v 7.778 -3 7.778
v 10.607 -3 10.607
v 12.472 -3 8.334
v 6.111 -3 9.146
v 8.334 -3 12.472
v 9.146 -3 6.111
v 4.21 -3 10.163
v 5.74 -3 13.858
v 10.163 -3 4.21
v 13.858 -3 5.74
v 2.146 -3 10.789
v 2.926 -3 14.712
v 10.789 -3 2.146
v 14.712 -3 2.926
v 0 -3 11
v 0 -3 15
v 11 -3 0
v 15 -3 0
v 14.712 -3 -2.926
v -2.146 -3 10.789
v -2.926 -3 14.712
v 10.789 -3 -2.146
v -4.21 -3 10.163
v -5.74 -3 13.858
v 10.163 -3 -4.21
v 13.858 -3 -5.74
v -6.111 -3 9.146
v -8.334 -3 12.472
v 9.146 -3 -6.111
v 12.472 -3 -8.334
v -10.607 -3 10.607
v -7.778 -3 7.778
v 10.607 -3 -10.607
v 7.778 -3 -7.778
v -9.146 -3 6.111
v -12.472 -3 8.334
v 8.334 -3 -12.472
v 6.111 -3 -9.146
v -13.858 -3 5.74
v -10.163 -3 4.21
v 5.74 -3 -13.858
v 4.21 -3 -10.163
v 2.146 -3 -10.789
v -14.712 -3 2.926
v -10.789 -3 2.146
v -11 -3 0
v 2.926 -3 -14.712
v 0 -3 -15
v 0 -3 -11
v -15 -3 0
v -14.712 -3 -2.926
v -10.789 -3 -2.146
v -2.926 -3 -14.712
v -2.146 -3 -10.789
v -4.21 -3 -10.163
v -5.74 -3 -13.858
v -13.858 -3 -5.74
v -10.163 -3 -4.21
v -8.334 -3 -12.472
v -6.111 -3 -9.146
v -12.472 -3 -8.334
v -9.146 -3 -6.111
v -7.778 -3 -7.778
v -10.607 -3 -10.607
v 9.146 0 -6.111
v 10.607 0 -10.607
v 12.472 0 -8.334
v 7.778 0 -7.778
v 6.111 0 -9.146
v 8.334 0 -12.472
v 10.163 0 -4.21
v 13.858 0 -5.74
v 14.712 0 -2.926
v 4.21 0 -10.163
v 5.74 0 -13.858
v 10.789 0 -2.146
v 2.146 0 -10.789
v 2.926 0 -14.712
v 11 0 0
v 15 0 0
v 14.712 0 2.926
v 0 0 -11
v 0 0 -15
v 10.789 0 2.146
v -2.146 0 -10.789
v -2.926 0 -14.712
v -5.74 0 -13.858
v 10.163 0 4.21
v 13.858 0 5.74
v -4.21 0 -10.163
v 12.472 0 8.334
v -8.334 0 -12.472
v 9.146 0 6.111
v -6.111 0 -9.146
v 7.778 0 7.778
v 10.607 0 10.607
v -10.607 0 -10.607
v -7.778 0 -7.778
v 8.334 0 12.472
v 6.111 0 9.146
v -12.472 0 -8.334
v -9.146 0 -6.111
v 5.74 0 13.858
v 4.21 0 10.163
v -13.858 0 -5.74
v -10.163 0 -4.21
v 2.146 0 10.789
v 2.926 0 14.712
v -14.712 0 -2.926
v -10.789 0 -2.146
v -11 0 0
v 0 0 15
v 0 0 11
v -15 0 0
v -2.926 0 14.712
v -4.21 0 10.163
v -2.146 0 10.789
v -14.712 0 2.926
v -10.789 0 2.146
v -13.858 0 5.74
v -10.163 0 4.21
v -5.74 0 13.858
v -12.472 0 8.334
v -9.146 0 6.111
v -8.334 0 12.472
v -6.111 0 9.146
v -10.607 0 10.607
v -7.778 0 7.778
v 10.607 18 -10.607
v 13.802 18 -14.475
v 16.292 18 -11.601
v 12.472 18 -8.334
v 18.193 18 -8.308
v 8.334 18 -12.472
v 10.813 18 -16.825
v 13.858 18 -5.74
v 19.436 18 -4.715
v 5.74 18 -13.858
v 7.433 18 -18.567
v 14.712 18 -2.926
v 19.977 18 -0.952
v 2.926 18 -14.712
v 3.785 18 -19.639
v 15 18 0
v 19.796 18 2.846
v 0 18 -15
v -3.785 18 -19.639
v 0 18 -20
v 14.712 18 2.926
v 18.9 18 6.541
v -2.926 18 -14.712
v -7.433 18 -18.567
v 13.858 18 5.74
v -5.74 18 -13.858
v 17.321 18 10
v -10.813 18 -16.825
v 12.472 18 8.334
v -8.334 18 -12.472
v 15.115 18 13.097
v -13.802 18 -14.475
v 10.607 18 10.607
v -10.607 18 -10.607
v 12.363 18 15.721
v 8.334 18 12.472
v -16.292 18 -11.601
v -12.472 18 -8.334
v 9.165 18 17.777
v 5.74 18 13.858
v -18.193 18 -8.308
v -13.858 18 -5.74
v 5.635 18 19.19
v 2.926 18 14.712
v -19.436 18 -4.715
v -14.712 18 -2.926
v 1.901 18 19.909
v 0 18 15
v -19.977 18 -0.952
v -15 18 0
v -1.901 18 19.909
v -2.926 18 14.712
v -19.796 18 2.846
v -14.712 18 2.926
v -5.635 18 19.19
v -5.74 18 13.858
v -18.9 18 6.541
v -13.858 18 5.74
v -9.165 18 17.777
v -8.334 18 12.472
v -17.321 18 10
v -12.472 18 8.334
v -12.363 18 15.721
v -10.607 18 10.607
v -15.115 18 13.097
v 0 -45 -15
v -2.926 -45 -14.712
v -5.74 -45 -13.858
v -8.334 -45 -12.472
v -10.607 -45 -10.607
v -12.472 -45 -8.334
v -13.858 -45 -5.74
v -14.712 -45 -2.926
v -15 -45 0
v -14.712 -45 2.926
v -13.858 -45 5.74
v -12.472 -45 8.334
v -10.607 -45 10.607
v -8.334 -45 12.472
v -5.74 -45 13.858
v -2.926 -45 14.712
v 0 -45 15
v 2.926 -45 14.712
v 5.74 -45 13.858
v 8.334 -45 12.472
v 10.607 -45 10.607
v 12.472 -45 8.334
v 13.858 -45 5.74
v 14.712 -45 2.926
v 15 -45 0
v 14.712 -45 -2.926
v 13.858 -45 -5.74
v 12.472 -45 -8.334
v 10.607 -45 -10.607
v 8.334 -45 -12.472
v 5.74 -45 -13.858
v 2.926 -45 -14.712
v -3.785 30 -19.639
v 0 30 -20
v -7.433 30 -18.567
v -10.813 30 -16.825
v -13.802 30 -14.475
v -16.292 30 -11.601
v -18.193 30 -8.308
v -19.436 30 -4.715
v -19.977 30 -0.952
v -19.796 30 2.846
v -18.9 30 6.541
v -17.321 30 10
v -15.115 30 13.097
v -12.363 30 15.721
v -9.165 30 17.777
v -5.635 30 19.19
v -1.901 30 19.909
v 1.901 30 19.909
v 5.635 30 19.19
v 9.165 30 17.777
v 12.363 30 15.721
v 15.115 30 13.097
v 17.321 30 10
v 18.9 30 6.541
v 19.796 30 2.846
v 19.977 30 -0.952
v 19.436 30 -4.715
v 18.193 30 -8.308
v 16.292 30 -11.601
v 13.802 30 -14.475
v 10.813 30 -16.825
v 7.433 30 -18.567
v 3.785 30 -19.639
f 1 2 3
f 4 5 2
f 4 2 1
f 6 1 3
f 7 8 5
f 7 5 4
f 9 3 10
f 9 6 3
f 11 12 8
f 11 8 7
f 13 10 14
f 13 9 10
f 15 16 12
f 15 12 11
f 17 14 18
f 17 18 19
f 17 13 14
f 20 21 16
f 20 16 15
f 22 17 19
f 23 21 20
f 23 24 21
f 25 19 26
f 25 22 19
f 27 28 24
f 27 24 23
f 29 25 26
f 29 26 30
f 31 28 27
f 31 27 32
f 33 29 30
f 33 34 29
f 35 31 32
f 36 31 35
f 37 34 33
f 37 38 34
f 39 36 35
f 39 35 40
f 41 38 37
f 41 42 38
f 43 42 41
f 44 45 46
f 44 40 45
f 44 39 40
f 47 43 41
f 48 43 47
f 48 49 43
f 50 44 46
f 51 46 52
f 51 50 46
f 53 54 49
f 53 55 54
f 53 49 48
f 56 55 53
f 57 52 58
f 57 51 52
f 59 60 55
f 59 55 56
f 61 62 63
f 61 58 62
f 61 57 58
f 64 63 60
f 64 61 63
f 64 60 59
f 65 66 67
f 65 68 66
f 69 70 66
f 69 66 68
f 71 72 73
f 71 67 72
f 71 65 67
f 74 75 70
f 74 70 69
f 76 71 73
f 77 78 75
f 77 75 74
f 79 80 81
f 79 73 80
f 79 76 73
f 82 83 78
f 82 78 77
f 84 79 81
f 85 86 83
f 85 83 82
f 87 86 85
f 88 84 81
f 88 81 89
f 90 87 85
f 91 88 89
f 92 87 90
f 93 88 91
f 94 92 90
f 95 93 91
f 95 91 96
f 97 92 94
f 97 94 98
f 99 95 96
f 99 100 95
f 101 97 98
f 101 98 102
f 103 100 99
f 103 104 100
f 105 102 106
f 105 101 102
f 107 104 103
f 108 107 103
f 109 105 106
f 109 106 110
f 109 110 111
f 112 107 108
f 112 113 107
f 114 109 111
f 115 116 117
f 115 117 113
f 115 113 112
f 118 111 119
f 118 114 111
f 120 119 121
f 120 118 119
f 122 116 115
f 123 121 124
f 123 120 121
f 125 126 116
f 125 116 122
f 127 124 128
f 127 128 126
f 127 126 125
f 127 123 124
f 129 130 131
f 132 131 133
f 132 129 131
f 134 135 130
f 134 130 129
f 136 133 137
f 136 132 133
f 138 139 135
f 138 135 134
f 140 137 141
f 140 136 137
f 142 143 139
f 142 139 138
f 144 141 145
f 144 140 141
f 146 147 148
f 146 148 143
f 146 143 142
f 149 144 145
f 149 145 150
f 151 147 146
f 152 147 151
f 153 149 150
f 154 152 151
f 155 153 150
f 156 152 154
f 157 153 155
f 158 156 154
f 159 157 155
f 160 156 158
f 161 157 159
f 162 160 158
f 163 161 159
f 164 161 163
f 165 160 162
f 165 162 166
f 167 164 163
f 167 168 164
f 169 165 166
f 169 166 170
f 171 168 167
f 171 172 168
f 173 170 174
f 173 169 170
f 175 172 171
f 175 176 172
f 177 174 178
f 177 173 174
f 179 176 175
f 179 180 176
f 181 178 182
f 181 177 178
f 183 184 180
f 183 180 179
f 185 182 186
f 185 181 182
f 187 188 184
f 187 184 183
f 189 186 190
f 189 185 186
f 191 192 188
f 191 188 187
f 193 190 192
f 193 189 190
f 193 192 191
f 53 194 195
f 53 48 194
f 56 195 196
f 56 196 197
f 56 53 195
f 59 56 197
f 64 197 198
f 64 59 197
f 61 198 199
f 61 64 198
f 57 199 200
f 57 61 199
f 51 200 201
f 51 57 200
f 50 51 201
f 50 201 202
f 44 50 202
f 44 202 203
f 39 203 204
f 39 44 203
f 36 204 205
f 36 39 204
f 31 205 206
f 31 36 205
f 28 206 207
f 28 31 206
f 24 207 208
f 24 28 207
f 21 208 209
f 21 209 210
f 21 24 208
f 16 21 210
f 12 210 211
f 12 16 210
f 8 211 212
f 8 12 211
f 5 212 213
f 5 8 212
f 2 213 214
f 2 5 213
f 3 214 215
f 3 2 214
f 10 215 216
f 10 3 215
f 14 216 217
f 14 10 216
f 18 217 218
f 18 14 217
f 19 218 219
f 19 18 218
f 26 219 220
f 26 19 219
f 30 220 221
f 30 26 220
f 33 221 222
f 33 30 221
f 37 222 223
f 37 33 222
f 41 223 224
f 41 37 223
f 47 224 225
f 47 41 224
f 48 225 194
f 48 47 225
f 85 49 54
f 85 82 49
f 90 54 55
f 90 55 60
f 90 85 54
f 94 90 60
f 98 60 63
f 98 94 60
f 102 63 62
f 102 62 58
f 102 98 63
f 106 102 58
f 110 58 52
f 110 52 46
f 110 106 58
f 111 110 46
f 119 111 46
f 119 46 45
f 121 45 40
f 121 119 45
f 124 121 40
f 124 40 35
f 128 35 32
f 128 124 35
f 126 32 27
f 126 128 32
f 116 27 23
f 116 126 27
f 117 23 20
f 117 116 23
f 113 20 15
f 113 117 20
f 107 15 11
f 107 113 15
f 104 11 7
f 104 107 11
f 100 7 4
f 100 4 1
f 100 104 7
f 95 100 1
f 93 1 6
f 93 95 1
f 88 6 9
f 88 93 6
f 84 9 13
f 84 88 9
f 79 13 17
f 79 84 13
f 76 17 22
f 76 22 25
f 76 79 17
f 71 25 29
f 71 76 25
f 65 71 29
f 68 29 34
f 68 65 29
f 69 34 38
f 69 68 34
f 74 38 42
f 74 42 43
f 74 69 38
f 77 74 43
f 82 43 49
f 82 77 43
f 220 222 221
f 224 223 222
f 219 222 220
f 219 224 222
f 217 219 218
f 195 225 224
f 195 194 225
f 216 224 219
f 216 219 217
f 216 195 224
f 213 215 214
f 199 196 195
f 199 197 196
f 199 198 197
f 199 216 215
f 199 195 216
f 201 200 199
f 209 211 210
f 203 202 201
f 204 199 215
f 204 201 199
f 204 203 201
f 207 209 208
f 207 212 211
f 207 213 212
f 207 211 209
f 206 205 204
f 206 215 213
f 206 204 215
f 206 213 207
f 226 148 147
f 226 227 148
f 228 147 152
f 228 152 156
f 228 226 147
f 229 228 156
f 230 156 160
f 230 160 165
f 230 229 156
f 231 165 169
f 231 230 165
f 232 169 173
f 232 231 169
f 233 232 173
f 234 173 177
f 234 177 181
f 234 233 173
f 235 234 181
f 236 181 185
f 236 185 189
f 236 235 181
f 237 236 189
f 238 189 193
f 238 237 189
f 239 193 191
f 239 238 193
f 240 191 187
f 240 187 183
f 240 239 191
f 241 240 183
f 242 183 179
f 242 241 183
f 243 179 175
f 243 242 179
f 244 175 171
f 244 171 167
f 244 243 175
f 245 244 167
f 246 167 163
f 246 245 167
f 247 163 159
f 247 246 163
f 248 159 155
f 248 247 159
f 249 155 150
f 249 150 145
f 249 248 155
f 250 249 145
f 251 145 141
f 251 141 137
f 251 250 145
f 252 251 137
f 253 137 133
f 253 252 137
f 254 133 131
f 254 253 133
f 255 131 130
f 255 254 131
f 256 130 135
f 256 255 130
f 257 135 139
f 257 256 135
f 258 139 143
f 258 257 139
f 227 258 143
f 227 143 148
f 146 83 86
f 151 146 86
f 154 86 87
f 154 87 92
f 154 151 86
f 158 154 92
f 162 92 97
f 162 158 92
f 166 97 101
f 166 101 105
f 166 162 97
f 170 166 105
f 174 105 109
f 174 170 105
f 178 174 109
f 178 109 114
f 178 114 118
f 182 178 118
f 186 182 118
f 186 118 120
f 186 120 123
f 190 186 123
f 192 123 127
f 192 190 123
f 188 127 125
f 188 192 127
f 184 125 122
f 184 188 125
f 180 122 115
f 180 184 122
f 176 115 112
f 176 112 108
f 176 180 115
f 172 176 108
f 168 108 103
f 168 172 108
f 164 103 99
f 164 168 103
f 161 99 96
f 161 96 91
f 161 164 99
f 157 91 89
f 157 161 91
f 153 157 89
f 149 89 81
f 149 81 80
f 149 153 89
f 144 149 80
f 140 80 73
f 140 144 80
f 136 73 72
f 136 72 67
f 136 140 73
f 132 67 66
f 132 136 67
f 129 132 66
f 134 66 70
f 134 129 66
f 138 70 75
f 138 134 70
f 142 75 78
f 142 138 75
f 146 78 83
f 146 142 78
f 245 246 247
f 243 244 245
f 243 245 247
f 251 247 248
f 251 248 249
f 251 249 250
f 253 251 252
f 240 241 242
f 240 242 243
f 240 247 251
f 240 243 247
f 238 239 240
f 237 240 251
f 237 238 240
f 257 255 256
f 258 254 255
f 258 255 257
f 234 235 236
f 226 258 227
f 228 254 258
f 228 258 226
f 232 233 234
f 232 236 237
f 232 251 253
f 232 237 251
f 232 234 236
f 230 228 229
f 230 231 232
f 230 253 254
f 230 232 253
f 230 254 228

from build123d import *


with BuildPart() as part:
    # SK_EStop → EStop (revolve)
    with BuildSketch(Plane.XY, mode=Mode.PRIVATE) as estop_sk:
        Polygon((0, -45), (15, -45), (15, -3), (11, -3), (11, 0), (15, 0), (15, 18), (20, 18), (20, 30), (0, 30), align=None)
    revolve(estop_sk.sketch.rotate(Axis((0, -50, 0), (0, 1, 0)), 90), axis=Axis((0, -50, 0), (0, 1, 0)))


solid = part.part
